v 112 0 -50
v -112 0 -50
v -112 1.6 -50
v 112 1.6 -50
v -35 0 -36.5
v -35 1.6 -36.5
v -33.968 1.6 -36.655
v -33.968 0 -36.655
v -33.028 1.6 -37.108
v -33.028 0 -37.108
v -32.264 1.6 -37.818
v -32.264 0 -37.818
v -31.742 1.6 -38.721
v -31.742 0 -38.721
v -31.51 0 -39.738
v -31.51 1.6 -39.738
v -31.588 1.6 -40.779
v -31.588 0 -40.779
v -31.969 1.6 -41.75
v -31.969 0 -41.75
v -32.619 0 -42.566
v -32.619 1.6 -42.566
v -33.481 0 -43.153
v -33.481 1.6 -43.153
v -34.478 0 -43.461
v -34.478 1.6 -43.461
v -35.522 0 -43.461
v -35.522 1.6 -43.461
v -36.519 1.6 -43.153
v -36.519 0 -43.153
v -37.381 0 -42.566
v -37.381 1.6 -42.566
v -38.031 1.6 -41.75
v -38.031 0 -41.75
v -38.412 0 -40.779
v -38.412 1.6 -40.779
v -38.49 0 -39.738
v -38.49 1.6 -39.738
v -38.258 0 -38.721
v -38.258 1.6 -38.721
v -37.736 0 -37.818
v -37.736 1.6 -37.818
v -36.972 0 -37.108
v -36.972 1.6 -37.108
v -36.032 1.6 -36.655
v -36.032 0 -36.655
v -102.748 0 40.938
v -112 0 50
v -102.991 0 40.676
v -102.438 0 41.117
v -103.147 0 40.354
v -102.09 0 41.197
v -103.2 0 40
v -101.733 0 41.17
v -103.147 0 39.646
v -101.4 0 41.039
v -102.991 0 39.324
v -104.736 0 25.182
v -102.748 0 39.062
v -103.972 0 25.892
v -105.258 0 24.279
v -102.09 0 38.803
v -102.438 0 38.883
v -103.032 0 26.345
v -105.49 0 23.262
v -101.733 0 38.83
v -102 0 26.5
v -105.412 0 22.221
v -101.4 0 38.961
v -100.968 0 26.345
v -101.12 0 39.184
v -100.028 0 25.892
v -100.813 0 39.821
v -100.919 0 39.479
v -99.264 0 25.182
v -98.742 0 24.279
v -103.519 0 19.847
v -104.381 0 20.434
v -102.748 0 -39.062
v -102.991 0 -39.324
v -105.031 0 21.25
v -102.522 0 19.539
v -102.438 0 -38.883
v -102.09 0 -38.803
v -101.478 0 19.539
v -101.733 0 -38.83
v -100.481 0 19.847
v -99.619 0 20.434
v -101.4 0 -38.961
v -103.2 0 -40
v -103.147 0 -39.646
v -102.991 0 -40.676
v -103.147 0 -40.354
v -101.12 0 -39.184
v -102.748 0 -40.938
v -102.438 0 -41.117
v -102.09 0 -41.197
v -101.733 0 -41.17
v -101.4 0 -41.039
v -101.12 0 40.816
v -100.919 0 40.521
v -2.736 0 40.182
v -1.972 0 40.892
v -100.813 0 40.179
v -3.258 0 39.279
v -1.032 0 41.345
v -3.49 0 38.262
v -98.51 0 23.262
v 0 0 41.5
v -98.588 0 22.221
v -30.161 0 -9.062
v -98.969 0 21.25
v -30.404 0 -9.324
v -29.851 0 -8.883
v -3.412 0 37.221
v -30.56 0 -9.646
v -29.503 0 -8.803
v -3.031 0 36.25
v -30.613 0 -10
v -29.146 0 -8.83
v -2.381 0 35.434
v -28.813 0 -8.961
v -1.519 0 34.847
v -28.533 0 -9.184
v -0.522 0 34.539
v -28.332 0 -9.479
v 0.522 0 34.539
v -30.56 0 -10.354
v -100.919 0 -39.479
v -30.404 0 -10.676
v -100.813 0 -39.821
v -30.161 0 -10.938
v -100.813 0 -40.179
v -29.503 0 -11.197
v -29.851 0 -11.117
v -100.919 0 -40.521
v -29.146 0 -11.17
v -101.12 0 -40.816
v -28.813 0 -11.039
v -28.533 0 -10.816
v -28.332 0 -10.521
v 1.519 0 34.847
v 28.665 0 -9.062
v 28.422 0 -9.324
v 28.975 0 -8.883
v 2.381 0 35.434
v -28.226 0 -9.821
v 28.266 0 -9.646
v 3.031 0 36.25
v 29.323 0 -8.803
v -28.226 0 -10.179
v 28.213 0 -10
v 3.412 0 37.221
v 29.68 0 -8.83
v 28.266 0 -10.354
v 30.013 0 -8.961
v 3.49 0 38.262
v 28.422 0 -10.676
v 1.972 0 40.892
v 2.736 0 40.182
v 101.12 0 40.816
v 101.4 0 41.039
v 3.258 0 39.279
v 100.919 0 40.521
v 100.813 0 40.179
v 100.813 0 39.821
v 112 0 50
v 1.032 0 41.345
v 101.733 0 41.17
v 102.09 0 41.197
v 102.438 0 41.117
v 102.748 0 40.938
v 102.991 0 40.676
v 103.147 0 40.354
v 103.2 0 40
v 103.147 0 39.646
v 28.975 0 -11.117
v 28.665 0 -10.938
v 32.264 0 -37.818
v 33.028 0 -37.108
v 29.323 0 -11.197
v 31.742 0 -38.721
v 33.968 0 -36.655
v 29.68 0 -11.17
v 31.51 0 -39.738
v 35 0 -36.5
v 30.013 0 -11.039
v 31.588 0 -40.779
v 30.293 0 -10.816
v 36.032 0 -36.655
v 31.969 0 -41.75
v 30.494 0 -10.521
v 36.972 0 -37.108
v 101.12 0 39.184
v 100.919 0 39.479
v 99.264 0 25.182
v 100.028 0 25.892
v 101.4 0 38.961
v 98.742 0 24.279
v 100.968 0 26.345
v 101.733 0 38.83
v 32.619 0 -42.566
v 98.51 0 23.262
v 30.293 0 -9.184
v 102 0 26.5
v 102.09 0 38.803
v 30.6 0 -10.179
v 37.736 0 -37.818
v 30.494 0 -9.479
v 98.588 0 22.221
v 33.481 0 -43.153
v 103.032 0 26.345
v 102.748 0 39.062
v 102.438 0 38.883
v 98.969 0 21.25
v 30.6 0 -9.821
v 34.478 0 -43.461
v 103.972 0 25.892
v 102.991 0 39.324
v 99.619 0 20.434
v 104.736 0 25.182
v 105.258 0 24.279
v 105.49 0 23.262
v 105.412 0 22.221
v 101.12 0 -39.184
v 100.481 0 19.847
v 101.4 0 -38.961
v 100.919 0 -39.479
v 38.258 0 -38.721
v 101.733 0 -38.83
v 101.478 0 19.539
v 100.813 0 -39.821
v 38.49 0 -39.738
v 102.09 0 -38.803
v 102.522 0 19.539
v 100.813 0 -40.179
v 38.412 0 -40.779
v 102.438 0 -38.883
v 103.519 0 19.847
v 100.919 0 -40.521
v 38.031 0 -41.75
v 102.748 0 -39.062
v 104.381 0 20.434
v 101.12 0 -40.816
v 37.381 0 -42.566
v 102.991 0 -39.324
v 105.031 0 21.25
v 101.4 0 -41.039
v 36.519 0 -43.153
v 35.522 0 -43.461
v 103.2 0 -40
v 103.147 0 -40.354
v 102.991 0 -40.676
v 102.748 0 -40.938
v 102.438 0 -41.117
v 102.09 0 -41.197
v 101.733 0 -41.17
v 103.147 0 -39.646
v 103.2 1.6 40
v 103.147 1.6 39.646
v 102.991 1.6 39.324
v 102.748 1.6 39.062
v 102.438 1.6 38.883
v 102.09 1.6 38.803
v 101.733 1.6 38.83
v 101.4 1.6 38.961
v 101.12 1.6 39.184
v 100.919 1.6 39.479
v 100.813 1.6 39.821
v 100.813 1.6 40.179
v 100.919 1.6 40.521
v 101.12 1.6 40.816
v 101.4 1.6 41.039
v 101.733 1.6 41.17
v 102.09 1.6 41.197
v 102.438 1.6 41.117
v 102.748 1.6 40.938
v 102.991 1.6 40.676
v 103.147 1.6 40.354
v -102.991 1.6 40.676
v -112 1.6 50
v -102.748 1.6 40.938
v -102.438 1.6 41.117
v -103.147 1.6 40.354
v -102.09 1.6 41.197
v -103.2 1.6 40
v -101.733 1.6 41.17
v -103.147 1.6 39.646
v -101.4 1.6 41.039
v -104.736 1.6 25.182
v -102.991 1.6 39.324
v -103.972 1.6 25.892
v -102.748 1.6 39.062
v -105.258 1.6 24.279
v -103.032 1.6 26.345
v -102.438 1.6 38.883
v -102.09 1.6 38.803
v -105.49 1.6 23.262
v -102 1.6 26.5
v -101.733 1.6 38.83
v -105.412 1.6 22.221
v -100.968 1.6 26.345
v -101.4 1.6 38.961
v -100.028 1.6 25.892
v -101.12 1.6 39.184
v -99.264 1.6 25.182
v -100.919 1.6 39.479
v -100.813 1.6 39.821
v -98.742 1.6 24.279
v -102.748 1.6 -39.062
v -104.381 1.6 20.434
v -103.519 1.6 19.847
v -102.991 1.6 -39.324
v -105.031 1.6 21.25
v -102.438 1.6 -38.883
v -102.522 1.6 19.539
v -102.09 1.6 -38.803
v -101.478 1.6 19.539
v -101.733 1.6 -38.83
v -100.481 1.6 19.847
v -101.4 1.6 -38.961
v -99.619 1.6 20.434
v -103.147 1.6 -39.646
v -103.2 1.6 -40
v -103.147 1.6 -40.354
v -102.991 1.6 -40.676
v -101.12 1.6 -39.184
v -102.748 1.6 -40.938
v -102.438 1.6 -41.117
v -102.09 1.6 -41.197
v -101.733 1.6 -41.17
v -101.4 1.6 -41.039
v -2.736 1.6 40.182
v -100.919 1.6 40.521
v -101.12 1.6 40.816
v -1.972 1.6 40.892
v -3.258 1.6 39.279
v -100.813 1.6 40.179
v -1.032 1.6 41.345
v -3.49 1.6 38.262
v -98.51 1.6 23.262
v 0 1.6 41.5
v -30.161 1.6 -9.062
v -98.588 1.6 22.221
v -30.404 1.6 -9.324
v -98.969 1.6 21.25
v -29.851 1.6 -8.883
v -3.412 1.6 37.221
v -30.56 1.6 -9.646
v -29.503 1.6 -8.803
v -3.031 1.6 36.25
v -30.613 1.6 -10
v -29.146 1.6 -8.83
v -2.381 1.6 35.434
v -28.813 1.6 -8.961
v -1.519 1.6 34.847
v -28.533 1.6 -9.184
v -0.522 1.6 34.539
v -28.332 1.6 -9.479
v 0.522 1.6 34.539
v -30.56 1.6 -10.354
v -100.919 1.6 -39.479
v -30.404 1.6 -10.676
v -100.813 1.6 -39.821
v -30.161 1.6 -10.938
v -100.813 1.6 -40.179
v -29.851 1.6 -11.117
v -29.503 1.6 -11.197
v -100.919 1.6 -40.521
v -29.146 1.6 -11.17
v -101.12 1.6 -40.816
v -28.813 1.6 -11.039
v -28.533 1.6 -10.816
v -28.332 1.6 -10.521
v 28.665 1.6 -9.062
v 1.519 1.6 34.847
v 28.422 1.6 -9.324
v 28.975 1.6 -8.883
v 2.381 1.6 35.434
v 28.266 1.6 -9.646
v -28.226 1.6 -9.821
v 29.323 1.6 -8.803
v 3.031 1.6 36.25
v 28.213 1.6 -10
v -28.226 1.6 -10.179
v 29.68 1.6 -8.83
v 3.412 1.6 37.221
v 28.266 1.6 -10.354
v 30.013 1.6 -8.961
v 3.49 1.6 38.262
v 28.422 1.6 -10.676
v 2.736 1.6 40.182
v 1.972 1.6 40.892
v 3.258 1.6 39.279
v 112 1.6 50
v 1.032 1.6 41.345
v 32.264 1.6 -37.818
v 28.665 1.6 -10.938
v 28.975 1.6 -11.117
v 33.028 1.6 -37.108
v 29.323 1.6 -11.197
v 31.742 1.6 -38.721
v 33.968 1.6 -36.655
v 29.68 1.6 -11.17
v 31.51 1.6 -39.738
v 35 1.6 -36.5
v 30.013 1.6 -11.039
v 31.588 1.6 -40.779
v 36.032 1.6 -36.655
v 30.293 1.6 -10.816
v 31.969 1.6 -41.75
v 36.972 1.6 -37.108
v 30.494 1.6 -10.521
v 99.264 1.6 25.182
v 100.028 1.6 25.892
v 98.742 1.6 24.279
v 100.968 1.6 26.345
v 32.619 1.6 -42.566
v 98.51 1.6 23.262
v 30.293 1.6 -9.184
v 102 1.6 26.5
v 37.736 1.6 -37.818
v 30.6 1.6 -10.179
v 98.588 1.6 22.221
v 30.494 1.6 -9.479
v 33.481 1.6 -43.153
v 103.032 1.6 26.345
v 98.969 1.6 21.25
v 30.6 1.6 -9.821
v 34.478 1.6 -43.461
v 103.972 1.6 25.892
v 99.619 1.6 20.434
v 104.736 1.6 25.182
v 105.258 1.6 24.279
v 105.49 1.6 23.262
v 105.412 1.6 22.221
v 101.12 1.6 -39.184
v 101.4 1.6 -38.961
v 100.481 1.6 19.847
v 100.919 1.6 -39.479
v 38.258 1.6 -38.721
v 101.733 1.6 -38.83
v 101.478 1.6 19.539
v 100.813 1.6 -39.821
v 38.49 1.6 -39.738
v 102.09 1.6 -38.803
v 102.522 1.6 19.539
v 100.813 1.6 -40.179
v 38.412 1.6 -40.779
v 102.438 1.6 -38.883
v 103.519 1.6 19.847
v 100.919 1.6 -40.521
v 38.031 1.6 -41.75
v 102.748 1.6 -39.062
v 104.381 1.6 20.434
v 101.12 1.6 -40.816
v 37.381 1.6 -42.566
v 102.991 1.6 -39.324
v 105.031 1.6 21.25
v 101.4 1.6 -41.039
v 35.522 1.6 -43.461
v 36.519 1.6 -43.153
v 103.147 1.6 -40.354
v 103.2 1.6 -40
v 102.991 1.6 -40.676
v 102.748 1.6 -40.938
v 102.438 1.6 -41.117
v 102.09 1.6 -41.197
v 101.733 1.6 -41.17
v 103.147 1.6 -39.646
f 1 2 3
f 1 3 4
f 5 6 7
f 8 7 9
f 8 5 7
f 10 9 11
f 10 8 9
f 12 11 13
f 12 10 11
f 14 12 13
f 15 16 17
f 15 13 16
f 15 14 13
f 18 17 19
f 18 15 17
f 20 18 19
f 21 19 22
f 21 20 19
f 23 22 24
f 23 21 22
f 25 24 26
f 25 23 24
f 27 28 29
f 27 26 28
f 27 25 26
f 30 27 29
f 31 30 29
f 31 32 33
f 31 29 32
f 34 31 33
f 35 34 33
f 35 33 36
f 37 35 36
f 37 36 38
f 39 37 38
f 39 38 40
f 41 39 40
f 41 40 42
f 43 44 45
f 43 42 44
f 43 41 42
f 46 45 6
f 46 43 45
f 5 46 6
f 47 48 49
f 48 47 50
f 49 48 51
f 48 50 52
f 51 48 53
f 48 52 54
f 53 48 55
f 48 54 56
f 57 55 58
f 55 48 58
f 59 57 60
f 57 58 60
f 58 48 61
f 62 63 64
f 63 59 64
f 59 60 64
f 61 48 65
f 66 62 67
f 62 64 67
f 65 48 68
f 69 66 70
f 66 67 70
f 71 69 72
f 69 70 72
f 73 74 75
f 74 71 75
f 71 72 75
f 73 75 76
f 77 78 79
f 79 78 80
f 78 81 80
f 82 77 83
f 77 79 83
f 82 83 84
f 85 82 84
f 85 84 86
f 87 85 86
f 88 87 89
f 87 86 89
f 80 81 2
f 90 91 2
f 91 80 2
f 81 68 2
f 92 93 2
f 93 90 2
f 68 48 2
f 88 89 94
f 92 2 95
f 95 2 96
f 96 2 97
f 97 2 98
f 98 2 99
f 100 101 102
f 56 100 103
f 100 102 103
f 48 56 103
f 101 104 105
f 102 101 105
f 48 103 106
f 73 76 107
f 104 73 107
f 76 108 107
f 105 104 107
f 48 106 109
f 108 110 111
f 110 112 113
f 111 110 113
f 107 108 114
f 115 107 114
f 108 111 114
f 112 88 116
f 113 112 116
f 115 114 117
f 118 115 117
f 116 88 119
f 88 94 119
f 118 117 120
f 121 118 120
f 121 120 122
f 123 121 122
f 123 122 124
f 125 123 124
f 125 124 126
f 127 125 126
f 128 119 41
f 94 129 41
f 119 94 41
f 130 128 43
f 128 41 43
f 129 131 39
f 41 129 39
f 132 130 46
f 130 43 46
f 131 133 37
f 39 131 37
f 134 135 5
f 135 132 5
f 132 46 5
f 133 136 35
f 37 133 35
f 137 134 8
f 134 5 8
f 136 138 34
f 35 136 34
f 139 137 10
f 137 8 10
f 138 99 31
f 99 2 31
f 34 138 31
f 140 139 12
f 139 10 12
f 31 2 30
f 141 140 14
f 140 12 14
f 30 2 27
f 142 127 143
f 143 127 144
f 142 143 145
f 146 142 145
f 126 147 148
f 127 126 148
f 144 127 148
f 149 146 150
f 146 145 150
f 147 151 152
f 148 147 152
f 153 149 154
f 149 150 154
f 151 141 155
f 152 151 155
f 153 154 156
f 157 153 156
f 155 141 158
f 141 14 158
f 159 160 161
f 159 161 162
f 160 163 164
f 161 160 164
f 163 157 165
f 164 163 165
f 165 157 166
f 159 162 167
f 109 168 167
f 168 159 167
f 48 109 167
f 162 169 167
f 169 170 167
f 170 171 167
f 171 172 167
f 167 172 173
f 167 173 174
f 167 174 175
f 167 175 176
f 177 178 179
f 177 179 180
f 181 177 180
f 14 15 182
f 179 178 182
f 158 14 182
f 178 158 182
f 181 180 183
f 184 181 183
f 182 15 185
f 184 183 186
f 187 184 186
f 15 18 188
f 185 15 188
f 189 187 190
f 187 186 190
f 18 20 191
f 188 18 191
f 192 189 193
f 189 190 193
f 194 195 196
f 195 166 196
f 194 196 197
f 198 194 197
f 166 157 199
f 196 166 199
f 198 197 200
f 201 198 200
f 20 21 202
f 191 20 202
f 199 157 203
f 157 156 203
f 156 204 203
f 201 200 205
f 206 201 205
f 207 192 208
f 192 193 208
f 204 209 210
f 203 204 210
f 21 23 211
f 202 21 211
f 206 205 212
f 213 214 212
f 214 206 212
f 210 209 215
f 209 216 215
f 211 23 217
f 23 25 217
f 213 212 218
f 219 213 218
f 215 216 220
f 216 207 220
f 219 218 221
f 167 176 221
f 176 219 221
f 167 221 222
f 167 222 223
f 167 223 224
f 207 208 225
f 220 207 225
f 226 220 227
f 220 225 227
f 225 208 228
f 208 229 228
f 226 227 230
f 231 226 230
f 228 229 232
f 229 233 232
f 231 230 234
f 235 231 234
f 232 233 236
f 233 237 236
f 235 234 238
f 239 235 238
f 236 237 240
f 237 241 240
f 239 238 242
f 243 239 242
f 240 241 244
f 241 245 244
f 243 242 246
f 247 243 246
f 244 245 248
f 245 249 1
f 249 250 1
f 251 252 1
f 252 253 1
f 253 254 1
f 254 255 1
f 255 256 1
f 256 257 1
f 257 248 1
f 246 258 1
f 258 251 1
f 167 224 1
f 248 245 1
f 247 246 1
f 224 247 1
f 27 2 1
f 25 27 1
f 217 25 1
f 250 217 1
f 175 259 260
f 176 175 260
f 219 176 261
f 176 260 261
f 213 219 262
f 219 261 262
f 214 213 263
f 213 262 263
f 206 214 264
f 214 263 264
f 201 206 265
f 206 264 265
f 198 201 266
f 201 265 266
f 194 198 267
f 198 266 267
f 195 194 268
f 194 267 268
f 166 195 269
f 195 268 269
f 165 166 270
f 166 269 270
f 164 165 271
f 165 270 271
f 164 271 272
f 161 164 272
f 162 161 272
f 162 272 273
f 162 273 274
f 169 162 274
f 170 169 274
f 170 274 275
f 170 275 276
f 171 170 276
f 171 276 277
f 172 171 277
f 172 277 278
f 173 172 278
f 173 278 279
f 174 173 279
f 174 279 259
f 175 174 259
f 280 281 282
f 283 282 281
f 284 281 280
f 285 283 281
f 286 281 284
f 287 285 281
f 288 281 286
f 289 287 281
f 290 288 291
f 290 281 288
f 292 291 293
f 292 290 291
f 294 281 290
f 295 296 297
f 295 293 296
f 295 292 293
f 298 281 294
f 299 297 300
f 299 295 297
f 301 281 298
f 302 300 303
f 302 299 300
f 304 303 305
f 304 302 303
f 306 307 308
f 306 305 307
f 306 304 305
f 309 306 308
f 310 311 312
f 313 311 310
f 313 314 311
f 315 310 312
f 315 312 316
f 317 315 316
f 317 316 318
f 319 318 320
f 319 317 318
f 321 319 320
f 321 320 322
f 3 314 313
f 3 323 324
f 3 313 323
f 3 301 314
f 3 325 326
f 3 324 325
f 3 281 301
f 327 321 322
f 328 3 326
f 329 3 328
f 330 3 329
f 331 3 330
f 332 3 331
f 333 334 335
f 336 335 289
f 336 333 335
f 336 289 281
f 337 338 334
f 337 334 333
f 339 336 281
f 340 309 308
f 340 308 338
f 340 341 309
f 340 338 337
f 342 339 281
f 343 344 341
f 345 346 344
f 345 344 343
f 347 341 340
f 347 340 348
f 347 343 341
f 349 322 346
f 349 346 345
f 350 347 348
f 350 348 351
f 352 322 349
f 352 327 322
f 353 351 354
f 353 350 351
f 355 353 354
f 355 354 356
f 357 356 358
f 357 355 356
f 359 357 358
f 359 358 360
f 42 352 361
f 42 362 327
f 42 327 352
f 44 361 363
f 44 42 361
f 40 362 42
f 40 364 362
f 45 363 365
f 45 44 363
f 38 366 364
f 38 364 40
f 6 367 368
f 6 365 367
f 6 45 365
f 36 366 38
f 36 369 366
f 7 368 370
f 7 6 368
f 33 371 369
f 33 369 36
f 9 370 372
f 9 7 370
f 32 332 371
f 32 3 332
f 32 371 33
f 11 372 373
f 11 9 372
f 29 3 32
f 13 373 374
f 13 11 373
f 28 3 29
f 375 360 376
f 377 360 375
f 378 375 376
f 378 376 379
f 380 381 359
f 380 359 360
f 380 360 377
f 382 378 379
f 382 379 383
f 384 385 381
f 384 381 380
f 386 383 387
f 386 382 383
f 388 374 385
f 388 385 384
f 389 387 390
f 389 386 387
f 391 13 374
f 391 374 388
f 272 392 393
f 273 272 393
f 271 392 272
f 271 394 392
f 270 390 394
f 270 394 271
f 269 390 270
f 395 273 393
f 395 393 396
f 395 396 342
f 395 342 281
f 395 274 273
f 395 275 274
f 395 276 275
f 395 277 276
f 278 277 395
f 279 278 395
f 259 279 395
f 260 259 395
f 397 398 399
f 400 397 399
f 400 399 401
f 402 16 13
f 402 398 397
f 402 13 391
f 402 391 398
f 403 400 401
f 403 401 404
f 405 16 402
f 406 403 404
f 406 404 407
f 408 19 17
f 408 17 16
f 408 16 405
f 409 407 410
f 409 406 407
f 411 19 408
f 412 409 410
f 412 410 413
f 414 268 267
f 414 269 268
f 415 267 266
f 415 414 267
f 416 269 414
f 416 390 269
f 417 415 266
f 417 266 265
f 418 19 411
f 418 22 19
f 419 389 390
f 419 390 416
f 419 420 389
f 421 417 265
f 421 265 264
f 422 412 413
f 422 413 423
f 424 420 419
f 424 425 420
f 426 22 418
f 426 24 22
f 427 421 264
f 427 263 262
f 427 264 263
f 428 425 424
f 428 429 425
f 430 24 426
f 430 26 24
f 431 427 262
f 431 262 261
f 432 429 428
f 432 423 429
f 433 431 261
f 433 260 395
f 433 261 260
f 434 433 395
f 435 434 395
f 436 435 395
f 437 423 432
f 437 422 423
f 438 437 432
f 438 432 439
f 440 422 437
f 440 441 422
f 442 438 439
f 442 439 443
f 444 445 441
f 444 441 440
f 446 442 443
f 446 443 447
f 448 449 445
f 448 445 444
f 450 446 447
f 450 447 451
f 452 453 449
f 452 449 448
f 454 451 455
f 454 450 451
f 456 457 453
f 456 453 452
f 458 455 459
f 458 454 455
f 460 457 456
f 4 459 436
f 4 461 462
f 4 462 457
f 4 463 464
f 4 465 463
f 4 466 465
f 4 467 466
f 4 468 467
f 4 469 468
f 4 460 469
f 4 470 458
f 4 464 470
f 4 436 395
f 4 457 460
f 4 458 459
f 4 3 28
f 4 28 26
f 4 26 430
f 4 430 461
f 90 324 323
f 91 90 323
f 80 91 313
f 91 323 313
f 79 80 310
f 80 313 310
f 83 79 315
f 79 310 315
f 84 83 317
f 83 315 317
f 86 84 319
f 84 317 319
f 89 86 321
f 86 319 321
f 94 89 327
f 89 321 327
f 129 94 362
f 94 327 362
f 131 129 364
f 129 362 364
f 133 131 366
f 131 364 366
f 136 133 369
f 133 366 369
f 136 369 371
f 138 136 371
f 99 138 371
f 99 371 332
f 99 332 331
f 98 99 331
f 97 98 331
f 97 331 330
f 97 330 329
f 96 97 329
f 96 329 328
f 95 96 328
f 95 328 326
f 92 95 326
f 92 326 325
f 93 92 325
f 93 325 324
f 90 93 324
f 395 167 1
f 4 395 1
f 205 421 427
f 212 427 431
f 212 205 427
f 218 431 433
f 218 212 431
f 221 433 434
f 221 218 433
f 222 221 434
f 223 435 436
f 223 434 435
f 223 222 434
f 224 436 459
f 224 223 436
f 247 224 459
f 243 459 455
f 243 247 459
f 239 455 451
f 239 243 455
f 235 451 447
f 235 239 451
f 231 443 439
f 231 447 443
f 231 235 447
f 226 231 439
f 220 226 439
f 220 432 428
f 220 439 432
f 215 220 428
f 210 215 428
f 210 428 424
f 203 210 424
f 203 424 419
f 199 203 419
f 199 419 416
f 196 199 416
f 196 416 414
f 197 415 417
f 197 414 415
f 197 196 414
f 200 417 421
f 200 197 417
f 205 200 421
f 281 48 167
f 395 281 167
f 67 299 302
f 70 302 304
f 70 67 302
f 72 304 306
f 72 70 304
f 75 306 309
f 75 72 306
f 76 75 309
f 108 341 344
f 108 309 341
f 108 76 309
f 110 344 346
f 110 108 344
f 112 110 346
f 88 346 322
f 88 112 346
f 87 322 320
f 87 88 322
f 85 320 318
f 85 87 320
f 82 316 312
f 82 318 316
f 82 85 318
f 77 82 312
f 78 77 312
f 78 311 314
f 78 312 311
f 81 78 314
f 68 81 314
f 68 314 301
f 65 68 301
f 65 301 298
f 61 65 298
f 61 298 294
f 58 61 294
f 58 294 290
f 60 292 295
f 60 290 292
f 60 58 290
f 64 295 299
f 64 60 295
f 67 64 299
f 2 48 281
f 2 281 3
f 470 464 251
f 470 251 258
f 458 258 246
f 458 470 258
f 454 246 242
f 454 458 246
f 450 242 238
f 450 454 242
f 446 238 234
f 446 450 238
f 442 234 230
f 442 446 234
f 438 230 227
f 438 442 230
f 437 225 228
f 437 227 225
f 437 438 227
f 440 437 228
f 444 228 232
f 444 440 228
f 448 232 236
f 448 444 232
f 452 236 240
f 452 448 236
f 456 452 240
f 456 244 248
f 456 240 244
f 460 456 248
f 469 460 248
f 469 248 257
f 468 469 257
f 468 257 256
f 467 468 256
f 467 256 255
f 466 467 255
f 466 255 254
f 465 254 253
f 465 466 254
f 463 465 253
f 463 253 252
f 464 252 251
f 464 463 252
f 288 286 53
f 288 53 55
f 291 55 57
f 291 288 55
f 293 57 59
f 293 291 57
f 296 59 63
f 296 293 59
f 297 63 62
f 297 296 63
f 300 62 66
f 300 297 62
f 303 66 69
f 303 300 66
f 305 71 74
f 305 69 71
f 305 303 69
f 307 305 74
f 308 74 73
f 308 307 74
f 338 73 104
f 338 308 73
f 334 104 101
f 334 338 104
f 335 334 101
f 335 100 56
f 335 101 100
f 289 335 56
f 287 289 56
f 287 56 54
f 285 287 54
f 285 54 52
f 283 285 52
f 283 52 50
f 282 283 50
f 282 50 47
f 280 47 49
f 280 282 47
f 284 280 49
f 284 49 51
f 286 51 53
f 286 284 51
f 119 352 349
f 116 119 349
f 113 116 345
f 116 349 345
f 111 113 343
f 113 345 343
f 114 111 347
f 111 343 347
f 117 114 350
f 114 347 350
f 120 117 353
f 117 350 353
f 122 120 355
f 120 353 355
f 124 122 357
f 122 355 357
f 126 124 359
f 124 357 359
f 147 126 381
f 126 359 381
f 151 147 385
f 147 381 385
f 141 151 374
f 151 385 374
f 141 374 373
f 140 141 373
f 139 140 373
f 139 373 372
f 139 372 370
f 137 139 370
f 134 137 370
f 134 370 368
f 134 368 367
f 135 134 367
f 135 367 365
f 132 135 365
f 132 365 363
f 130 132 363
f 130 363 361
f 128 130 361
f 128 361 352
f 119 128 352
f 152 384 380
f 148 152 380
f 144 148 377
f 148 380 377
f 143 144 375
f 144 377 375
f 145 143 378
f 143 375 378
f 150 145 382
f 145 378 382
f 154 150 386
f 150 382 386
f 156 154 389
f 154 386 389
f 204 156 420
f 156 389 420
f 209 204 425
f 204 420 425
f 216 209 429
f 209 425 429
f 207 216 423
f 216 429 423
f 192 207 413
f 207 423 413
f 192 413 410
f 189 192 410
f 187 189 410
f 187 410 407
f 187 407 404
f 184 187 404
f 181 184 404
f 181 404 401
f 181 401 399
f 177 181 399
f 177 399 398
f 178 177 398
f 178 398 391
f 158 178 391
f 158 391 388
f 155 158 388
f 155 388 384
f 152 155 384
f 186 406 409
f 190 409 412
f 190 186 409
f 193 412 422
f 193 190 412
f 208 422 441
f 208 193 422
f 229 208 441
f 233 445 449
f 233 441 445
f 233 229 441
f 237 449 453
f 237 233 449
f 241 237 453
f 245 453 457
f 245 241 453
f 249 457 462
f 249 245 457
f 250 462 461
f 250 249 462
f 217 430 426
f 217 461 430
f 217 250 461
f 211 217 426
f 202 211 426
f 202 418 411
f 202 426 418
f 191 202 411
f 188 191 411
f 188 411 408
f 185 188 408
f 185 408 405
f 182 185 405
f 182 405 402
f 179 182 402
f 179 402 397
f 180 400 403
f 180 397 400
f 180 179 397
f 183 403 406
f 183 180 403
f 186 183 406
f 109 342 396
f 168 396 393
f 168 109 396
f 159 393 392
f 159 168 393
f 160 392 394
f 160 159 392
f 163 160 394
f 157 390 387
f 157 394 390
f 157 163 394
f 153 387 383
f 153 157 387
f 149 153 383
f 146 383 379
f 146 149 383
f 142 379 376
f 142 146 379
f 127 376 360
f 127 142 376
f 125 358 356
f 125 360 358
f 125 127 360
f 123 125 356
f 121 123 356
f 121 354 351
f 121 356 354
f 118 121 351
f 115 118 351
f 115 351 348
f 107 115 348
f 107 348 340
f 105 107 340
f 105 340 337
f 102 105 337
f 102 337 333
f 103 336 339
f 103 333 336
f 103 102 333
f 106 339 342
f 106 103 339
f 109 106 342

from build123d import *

# Parameters (mm, degrees)
SKETCH1_W            = 224
SKETCH1_H            = 100
BOSS_EXTRUDE1_DEPTH  = 1.6
M2_CLEARANCE_HOLE1_D = 2.4
MIRROR2_COPY_1_D     = 2.4
SKETCH5_R            = 3.5
CUT_EXTRUDE2_DEPTH   = 123.664420269
M2_CLEARANCE_HOLE2_D = 2.4
SKETCH12_R           = 3.5
CUT_EXTRUDE3_DEPTH   = 2


with BuildPart() as part:
    # Sketch1 → Boss-Extrude1 (new body)
    with BuildSketch(Plane(origin=(0, 0, 0), x_dir=(1, 0, 0), z_dir=(0, 1, 0))):
        Rectangle(SKETCH1_W, SKETCH1_H)
    extrude(amount=BOSS_EXTRUDE1_DEPTH)

    # M2 Clearance Hole1 (through all)
    with Locations(Plane.XZ):
        with Locations((-102, -40)):
            m2_clearance_hole1 = Hole(M2_CLEARANCE_HOLE1_D / 2)

    # Mirror1: M2 Clearance Hole1 across plane
    add(m2_clearance_hole1.mirror(Plane(origin=(0, 0, 0), x_dir=(0, 0, 1), z_dir=(1, 0, 0))), mode=Mode.SUBTRACT)

    # Mirror2: M2 Clearance Hole1 across plane
    add(m2_clearance_hole1.mirror(Plane.XY), mode=Mode.SUBTRACT)

    # Mirror2 copy 1 (through all)
    with Locations(Plane(origin=(0, 0, 0), x_dir=(-1, 0, 0), z_dir=(0, -1, 0))):
        with Locations((-102, -40)):
            Hole(MIRROR2_COPY_1_D / 2)

    # Sketch5 → Cut-Extrude2 (cut, through all)
    with BuildSketch(Plane(origin=(0, 0, 0), x_dir=(1, 0, 0), z_dir=(0, 1, 0))):
        with Locations(Location((-35, 40, 0), (0, 0, 270))):
            Circle(SKETCH5_R)
        with Locations(Location((35, 40, 0), (0, 0, 270))):
            Circle(SKETCH5_R)
        with Locations(Location((0, -38, 0), (0, 0, 270))):
            Circle(SKETCH5_R)
    extrude(amount=CUT_EXTRUDE2_DEPTH, mode=Mode.SUBTRACT)

    # M2 Clearance Hole2 (through all)
    with Locations(Plane.XZ):
        with Locations((-102, 23), (-29.412991036, -10), (29.412991036, -10), (102, 23)):
            Hole(M2_CLEARANCE_HOLE2_D / 2)

    # Sketch12 → Cut-Extrude3 (cut)
    with BuildSketch(Plane(origin=(0, 0, 0), x_dir=(1, 0, 0), z_dir=(0, 1, 0))):
        with Locations(Location((-102, -23, 0), (0, 0, 270))):
            Circle(SKETCH12_R)
        with Locations(Location((102, -23, 0), (0, 0, 270))):
            Circle(SKETCH12_R)
    extrude(amount=CUT_EXTRUDE3_DEPTH, mode=Mode.SUBTRACT)


solid = part.part
